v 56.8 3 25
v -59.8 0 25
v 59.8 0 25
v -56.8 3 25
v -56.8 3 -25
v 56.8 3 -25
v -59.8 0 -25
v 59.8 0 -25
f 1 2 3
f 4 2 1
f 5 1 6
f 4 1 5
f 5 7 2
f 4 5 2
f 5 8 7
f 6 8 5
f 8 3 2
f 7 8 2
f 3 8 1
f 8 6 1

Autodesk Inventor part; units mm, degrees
ref_plane "YZ Plane" through (0, 0, 0) normal (1, 0, 0) x (0, 1, 0)
ref_plane "XZ Plane" through (0, 0, 0) normal (0, 1, 0) x (-1, 0, 0)
ref_plane "XY Plane" through (0, 0, 0) normal (0, 0, 1) x (1, 0, 0)
sketch "Sketch1" plane through (0, 0, 0) normal (0, 1, 0) x (-1, 0, 0)
  line L0 (59.8, 25) -> (-59.8, 25)
  line L1 (-59.8, 25) -> (-59.8, -25)
  line L2 (-59.8, -25) -> (59.8, -25)
  line L3 (59.8, -25) -> (59.8, 25)
  line L4 (59.8, 25) -> (-59.8, -25) construction
  line L5 (-59.8, 25) -> (59.8, -25) construction
  point P0 (0, 0)
  dimension "d0" = 119.6
  dimension "d1" = 50
extrude "Extrusion1" add sketch "Sketch1" along normal blind 3
chamfer "Chamfer1" distance 3 angle 45 1 edges at (59.8, 3, 0) measured on face at (59.8, 1, 8.3333)
chamfer "Chamfer2" distance 3 angle 45 1 edges at (-59.8, 3, 0) measured on face at (-59.8, 2, -8.3333)
properties part number "Right Wall"
